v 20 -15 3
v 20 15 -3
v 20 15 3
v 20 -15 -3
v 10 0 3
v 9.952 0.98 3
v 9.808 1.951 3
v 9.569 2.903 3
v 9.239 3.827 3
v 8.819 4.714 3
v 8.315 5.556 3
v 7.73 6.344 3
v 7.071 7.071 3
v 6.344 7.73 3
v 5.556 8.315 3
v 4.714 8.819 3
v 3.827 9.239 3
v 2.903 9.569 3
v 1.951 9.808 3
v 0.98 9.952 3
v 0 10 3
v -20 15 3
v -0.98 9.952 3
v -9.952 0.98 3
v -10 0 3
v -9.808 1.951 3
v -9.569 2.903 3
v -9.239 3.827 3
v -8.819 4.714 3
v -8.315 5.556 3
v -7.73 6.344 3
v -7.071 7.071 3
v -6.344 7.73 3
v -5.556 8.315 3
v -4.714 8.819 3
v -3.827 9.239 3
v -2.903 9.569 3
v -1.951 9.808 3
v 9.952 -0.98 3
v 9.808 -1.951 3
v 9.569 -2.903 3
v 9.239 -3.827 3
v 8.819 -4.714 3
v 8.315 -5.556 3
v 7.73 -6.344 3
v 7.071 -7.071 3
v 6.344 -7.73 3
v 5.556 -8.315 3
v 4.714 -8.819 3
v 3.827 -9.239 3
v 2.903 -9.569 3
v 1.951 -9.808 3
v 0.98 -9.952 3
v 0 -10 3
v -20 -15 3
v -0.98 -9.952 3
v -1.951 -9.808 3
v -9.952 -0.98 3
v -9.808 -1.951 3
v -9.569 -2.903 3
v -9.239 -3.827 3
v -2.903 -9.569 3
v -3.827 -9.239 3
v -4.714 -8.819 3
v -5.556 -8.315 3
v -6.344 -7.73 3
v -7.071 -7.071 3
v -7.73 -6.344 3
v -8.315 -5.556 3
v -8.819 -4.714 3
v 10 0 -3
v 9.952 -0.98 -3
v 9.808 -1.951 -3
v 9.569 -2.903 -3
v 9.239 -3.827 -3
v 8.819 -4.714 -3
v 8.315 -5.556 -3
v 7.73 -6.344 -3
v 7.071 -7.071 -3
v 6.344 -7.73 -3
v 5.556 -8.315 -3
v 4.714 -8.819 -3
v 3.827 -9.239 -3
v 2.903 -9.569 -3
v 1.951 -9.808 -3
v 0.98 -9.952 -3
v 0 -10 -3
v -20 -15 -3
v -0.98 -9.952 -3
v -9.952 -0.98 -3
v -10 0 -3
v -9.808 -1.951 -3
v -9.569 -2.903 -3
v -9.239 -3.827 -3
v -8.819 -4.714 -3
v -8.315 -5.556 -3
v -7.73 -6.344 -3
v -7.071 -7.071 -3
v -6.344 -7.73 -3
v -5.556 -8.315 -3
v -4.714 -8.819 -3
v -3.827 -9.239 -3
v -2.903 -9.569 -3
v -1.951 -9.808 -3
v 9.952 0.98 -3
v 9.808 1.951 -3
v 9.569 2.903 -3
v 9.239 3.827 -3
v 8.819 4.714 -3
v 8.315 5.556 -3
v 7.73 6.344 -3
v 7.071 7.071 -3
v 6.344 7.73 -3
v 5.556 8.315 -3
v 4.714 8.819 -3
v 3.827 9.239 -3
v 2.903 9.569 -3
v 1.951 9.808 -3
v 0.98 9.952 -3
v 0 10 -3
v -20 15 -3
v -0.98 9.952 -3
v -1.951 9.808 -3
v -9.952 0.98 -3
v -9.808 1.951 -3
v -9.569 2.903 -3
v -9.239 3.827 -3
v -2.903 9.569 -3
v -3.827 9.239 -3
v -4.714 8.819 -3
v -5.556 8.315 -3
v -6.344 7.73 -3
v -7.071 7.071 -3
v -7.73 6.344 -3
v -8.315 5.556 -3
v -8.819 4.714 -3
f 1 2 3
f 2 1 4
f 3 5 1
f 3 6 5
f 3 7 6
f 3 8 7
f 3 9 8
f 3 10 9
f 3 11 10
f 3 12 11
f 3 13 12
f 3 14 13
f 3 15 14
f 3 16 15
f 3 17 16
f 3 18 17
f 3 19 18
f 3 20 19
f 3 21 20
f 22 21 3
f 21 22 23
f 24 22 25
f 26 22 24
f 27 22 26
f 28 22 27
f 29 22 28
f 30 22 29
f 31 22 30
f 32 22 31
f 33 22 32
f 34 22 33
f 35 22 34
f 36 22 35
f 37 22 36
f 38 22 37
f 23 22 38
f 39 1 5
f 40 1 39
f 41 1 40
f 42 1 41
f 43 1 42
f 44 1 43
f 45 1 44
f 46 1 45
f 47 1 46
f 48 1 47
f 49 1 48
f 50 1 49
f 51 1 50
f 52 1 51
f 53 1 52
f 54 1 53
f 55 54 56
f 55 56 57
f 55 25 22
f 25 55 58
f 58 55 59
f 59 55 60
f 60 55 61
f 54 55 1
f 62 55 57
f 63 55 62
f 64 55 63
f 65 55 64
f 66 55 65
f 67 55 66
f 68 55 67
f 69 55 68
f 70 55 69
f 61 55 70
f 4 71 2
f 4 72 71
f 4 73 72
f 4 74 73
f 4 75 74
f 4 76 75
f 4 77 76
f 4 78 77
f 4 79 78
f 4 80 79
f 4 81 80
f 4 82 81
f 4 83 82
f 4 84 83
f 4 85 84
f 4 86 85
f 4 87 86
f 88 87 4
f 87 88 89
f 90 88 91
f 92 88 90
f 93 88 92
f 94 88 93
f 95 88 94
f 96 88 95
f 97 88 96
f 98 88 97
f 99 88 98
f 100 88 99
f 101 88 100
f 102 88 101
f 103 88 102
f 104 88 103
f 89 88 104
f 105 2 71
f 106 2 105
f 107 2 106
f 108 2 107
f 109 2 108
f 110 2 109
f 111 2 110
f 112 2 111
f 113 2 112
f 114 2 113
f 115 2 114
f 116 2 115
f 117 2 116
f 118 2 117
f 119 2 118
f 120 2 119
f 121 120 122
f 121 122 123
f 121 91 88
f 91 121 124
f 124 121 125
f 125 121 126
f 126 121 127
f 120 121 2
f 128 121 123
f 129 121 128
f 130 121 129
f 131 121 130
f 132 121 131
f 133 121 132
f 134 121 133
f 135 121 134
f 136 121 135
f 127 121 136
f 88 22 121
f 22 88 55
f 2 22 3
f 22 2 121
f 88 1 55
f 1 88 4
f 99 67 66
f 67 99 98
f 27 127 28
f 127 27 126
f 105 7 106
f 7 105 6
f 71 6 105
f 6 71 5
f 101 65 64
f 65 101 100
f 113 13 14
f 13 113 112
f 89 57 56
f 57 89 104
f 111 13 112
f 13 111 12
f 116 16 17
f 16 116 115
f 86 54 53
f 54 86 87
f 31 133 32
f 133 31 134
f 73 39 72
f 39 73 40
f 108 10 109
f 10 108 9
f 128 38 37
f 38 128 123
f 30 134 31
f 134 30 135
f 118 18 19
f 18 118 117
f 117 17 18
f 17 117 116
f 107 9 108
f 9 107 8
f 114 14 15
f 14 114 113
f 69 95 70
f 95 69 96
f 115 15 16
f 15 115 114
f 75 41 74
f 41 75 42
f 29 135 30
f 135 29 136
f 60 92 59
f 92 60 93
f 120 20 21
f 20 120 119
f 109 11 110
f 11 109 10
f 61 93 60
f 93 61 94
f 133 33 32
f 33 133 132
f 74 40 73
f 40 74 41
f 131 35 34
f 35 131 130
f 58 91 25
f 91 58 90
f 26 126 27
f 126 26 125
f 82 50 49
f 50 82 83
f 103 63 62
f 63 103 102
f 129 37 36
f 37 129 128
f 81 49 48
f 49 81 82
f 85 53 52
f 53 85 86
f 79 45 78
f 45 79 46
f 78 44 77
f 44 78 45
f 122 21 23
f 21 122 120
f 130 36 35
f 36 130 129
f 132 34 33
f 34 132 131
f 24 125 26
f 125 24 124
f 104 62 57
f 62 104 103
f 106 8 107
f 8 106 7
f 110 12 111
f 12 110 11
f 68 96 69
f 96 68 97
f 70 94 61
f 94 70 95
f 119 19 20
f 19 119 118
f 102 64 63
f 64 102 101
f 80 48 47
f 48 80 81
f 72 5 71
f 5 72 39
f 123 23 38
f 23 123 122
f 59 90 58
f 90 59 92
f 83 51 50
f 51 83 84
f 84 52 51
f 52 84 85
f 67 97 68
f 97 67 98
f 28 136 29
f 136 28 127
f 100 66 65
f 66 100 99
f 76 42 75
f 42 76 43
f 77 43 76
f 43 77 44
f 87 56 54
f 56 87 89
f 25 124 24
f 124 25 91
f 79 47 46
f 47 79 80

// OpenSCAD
// A mounting spacer: a plate with a central through-bore.

plate_x = 40;
plate_y = 30;
plate_z = 6;
bore_d  = 20;  // must stay under plate_y so the bore does not break out the sides
$fn = 64;

difference() {
    cube([plate_x, plate_y, plate_z], center = true);
    cylinder(h = plate_z + 2, d = bore_d, center = true);
}
